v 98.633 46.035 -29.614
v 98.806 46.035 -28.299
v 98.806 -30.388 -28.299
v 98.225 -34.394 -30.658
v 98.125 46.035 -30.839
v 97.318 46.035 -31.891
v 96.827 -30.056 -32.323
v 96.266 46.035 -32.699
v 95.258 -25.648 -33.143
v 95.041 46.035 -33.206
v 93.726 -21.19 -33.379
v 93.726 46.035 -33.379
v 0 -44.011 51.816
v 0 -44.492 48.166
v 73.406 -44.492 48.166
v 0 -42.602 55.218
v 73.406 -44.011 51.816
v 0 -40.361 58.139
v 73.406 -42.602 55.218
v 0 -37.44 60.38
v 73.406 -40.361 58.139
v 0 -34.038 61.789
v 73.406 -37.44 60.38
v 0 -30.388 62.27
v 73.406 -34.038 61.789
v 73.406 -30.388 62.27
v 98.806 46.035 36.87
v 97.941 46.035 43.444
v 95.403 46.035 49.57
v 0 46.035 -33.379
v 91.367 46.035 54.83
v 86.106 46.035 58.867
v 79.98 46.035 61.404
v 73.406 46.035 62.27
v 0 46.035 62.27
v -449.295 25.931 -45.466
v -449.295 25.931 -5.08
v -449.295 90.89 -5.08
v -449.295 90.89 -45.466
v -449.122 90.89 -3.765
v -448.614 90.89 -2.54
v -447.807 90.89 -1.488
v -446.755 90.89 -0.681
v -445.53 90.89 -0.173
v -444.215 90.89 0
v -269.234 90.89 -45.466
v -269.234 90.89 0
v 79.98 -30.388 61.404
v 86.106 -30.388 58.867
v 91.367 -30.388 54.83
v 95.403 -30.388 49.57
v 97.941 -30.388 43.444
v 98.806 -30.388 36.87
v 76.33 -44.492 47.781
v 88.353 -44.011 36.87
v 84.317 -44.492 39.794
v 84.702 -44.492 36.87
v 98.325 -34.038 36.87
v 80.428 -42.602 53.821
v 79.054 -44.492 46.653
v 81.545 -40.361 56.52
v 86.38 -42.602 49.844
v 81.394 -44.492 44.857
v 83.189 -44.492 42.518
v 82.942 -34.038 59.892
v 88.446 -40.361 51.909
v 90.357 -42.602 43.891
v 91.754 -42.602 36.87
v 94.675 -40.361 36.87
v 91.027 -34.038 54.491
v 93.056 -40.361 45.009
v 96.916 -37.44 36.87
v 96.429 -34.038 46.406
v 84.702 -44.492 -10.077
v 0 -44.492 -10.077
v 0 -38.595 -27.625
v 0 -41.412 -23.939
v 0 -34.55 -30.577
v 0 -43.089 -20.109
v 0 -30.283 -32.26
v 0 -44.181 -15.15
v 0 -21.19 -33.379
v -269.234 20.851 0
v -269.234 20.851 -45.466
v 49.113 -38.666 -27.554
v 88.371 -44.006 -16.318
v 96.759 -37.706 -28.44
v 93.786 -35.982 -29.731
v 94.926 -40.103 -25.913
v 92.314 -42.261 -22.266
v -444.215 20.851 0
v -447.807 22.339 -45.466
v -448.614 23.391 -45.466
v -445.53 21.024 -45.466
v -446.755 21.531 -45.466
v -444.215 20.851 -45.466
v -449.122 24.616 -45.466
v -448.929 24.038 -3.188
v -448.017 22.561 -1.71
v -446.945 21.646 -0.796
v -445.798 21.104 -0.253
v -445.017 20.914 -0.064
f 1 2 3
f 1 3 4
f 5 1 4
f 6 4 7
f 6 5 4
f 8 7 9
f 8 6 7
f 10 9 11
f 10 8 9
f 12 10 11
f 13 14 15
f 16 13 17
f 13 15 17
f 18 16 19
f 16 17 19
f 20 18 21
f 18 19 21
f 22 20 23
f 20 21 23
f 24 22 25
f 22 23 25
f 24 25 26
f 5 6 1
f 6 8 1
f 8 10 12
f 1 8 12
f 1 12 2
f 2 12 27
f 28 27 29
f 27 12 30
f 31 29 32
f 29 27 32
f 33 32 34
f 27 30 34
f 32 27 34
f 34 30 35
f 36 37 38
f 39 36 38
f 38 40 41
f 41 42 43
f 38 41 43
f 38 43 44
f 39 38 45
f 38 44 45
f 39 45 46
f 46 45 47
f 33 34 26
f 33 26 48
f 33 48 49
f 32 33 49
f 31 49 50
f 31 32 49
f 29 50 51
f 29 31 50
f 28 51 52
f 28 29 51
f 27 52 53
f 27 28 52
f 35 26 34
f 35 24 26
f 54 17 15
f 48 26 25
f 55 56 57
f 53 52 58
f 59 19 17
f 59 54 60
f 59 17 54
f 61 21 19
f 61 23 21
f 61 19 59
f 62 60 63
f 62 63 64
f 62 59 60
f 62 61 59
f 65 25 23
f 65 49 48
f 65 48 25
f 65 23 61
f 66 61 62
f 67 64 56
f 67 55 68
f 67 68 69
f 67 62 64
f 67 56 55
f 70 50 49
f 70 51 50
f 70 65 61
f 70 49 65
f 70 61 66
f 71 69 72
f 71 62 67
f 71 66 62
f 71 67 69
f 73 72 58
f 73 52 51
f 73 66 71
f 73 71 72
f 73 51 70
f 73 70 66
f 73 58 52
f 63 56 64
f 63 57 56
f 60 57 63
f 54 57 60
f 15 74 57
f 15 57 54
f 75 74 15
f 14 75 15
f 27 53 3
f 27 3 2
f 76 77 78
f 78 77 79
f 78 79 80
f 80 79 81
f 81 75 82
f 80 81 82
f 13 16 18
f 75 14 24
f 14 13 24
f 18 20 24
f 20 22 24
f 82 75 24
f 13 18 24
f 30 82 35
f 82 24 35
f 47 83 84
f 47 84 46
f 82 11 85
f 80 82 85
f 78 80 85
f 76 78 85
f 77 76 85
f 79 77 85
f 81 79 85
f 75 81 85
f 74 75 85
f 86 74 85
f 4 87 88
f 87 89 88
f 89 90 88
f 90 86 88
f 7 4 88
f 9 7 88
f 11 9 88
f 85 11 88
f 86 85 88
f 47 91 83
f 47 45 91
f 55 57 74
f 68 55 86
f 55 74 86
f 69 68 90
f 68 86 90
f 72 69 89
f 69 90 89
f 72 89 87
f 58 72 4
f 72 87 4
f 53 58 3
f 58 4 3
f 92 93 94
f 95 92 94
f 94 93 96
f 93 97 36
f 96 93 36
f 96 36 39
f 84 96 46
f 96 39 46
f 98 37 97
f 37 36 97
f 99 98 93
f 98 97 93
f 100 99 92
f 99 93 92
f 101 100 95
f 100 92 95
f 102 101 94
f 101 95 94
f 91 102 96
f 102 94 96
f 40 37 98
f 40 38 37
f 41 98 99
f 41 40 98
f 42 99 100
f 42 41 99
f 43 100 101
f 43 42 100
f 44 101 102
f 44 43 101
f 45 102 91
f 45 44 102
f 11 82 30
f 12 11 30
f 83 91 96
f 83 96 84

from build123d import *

# Parameters (mm, degrees)
F0_W        = 90.5269756913
F0_H        = 95.6492051482
F1_DEPTH    = 98.806
F2_R        = 25.4
F3_R        = 14.1038356314
F4_T1_DEPTH = 201.2121108887
F5_T1_DEPTH = 101.5149863872
F6_W        = 180.060595274
F6_H        = 70.0388215482
F7_DEPTH    = 45.466
F8_R        = 5.08


# Not quite as in the source:
# - a fillet or chamfer that OpenCascade refuses, or shapes differently, is made with other operations: its cross-section is extruded or revolved along the edge and cut away or added


with BuildPart() as f1:
    # F0 (on Right) → F1 (new body)
    with BuildSketch(Plane.YZ):
        with Locations((0.7718615234, 14.4452676177)):
            Rectangle(F0_W, F0_H)
    extrude(amount=F1_DEPTH)

    # F2
    f2_edges = [f1.edges().sort_by_distance(p)[0] for p in [
        (98.806, 0.771862, 62.26987),
    ]]
    fillet(f2_edges, radius=F2_R)

    # F3
    f3_edges = [f1.edges().sort_by_distance(p)[0] for p in [
        (36.703, -44.491626, 62.26987),
        (91.366512, -44.491626, 54.830382),
        (98.806, -44.491626, 1.745268),
    ]]
    fillet(f3_edges, radius=F3_R)

    # F4: fillet of radius 23.301989304 on 1 edges, made by hand

    # F4_s2 → F4_t1 (cut)
    with BuildSketch(Plane.YZ.offset(-58.2549732601)):
        with BuildLine():
            add(Edge.make_bspline(
                [(-44.4916263223, -10.0773456524), (-44.4916263223, -33.3793349564), (-21.1896370182, -33.3793349564)],
                knots=[0, 0, 0, 1, 1, 1], degree=2, weights=[1, 1, 1]))
            Line((-21.1896370182, -33.3793349564), (-44.4916263223, -33.3793349564))
            Line((-44.4916263223, -33.3793349564), (-44.4916263223, -10.0773456524))
        make_face()
    extrude(amount=F4_T1_DEPTH, mode=Mode.SUBTRACT)

    # F5: fillet of radius 5.08 on 1 edges, made by hand

    # F5_s2 → F5_t1 (cut)
    with BuildSketch(Plane.XZ.offset(-58.735349369)):
        with BuildLine():
            ThreePointArc((98.806, -28.2993349564), (97.3181024484, -31.8914374048), (93.726, -33.3793349564))
            Line((93.726, -33.3793349564), (98.806, -33.3793349564))
            Line((98.806, -33.3793349564), (98.806, -28.2993349564))
        make_face()
    extrude(amount=F5_T1_DEPTH, mode=Mode.SUBTRACT)


with BuildPart() as f7:
    # F6 (on Top) → F7 (new body)
    with BuildSketch(Plane.XY):
        with Locations((-359.2647463083, 55.8701176196)):
            Rectangle(F6_W, F6_H)
    extrude(amount=-F7_DEPTH)

    # F8
    f8_edges = [f7.edges().sort_by_distance(p)[0] for p in [
        (-449.295044, 55.870118, 0),
        (-449.295044, 20.850707, -22.733),
    ]]
    fillet(f8_edges, radius=F8_R)


solid = Compound([f1.part, f7.part])
